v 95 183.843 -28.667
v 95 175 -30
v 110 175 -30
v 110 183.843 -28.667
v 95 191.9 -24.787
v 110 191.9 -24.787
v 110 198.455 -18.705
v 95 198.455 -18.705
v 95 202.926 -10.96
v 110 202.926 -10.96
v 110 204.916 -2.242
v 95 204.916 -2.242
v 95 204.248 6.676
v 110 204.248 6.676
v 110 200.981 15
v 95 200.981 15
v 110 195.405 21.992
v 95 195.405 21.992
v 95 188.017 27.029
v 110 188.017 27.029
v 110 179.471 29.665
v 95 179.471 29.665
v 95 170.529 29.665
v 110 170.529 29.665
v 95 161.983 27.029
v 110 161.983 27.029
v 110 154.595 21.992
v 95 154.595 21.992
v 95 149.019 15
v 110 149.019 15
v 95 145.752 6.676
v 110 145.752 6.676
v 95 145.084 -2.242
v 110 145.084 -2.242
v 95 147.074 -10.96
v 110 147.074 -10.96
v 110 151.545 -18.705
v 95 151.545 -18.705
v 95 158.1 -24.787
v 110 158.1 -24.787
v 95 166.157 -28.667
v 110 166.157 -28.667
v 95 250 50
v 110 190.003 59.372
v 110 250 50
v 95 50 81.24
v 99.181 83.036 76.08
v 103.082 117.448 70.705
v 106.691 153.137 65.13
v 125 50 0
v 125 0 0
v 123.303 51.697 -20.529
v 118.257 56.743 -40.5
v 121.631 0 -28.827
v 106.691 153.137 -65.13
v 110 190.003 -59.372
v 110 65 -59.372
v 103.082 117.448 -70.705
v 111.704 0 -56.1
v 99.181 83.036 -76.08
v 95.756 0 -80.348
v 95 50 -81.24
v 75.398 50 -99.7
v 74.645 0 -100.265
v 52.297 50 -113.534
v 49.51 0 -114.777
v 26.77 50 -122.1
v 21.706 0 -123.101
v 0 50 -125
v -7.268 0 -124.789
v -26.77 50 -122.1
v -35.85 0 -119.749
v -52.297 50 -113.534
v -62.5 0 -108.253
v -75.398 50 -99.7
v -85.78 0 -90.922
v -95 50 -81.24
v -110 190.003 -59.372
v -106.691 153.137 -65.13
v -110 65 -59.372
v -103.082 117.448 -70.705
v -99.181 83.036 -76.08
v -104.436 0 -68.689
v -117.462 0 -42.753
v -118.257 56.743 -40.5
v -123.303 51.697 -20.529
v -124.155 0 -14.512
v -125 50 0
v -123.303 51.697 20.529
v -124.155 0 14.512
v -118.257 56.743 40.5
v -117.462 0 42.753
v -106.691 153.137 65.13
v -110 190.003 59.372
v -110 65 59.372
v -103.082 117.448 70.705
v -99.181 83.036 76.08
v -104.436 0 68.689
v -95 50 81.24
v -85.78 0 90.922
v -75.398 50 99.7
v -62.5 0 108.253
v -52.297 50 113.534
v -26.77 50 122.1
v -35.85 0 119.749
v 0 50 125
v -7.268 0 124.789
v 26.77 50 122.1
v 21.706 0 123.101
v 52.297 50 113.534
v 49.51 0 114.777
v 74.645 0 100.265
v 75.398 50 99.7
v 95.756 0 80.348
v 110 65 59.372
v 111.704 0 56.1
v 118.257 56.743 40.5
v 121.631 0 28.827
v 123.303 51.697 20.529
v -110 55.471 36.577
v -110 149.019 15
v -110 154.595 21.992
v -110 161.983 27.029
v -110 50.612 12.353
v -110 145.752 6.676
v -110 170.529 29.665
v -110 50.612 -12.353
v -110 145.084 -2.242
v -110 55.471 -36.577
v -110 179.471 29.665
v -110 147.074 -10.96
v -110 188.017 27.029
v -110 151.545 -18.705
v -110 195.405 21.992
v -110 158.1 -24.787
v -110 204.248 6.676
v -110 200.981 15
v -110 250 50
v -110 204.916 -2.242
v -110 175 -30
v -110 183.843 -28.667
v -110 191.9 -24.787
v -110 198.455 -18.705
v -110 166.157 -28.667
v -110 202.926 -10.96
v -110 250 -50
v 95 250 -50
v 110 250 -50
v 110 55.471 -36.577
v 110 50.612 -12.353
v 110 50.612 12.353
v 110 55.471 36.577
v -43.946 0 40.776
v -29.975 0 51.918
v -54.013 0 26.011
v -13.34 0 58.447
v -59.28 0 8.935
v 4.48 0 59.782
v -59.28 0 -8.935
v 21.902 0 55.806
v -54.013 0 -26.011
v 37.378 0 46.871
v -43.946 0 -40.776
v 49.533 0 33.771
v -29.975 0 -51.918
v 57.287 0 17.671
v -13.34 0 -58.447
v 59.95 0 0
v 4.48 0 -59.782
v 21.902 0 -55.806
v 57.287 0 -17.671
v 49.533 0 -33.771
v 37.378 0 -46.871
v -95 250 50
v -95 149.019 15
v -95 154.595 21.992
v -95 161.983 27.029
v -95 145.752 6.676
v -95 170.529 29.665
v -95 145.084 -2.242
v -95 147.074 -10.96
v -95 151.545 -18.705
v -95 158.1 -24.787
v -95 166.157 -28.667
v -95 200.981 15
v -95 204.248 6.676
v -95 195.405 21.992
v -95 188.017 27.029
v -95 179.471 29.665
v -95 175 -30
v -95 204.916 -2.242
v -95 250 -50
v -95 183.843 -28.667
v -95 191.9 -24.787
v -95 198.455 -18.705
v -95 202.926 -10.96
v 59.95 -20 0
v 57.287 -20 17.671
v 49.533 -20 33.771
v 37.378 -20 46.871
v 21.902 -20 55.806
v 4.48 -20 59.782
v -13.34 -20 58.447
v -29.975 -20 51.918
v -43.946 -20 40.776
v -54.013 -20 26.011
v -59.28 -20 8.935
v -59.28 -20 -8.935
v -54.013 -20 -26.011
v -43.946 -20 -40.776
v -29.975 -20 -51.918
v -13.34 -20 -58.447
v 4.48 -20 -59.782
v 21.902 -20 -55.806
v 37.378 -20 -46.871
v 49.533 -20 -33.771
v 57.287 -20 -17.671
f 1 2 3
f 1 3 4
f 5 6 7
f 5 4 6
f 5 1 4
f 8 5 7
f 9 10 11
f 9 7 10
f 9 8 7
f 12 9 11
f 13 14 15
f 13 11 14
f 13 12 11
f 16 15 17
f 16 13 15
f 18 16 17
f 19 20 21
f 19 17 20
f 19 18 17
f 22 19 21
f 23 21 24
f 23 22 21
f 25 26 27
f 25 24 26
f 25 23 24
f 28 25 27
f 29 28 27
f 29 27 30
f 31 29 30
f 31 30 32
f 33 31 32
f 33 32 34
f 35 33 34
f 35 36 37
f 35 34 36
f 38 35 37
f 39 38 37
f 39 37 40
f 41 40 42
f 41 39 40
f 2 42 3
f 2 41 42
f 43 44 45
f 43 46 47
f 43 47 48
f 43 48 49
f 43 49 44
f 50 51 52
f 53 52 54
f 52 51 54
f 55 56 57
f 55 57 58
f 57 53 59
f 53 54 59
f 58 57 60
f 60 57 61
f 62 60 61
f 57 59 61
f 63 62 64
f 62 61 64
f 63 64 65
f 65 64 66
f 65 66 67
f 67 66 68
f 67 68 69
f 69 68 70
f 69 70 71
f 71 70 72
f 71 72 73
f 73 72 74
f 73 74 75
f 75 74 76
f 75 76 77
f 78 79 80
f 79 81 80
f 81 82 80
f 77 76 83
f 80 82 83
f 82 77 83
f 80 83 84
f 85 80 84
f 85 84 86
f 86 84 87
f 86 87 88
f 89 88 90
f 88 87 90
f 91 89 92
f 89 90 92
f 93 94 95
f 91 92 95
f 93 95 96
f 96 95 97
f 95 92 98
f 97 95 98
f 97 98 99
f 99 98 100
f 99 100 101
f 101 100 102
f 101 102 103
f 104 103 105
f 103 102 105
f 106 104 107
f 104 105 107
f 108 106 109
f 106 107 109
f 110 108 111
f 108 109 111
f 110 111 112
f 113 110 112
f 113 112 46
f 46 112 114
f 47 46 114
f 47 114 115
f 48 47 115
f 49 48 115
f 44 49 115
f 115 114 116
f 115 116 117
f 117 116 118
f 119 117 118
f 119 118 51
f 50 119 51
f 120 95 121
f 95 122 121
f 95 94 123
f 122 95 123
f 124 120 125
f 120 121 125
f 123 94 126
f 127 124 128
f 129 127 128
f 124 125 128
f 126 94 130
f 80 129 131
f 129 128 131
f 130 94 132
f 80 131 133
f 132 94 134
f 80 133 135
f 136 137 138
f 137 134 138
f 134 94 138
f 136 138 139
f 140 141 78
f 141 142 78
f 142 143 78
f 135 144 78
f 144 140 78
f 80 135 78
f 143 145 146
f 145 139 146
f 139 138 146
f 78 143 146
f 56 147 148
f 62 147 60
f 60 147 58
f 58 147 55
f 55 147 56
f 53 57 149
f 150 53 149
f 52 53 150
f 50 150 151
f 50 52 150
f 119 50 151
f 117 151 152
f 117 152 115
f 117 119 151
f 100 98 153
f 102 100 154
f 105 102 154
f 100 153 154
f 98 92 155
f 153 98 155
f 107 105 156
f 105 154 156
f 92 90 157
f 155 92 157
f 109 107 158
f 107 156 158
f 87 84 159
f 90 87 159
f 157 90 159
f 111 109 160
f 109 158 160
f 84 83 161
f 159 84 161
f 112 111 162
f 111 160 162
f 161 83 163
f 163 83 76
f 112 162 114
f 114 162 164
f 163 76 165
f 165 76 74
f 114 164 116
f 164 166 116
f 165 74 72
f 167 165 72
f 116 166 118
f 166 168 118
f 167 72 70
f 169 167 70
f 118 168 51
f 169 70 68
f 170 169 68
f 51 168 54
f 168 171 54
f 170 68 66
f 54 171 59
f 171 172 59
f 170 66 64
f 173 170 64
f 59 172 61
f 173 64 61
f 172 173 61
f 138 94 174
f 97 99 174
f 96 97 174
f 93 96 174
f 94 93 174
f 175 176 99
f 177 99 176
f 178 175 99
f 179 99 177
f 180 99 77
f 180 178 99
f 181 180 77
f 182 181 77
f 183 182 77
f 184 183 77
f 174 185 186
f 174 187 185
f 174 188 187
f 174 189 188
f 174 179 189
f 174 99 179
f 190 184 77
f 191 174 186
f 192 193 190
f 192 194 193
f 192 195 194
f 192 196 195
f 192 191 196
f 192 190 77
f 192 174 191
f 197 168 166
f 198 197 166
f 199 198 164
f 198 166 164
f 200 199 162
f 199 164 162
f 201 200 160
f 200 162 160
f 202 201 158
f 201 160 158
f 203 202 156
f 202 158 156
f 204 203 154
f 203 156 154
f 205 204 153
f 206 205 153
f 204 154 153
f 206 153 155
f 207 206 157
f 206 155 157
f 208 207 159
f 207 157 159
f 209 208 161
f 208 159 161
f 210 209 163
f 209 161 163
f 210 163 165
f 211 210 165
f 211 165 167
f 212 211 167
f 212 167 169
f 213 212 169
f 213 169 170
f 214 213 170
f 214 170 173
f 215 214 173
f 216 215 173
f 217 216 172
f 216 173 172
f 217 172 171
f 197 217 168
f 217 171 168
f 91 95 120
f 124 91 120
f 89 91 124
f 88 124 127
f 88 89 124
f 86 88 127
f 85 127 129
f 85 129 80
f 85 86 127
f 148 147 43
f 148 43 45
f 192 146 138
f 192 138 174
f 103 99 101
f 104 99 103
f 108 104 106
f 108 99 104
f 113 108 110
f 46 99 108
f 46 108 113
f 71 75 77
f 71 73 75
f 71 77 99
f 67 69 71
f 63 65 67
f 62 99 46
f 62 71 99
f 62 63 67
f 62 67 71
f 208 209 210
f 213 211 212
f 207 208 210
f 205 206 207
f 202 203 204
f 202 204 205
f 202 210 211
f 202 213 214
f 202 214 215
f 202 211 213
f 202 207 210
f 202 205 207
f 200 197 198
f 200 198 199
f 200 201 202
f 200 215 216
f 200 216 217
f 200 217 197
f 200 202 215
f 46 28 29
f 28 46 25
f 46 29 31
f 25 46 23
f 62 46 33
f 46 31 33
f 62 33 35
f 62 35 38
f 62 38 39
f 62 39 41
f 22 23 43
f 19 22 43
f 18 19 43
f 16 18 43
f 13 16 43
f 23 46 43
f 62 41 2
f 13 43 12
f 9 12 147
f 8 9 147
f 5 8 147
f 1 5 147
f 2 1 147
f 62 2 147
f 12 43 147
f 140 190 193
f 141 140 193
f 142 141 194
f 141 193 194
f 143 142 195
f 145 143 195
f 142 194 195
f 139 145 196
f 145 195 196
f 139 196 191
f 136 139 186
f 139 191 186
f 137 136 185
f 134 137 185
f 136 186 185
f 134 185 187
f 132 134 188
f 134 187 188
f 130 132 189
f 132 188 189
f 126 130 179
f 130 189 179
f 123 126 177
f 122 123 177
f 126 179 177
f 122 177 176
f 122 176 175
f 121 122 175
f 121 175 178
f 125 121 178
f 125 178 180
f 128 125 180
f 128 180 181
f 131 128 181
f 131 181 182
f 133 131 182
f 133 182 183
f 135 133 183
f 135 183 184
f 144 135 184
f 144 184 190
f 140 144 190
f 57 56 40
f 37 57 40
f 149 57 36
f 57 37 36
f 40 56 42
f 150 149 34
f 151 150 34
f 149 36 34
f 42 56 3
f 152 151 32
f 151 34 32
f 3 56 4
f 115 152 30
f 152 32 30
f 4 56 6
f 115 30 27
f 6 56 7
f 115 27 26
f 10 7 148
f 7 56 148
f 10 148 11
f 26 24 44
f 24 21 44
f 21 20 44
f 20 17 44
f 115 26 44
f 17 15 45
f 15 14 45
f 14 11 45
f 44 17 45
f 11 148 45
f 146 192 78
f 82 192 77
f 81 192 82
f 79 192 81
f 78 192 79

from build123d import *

# Parameters (mm, degrees)
SKETCH1_R               = 125
BOSS_EXTRUDE1_DEPTH     = 250
SKETCH3_W               = 190
SKETCH3_H               = 250
CUT_EXTRUDE1_DEPTH      = 200
CUT_EXTRUDE3_DEPTH      = 221
CUT_EXTRUDE3_DEPTH_BACK = 31
SKETCH8_R               = 30
CUT_EXTRUDE4_DEPTH      = 221
CUT_EXTRUDE4_DEPTH_BACK = 31
SKETCH6_R               = 125
CUT_EXTRUDE8_DEPTH      = 60
SKETCH7_R               = 125
CUT_EXTRUDE9_DEPTH      = 60
SKETCH9_R               = 59.95
BOSS_EXTRUDE2_DEPTH     = 20


with BuildPart() as part:
    # Sketch1 → Boss-Extrude1 (new body)
    with BuildSketch(Plane(origin=(0, 0, 0), x_dir=(1, 0, 0), z_dir=(0, 1, 0))):
        Circle(SKETCH1_R)
    extrude(amount=BOSS_EXTRUDE1_DEPTH)

    # Sketch3 → Cut-Extrude1 (cut)
    with BuildSketch(Plane(origin=(0, 250, 0), x_dir=(1, 0, 0), z_dir=(0, 1, 0))):
        Rectangle(SKETCH3_W, SKETCH3_H)
    extrude(amount=-CUT_EXTRUDE1_DEPTH, mode=Mode.SUBTRACT)

    # Sketch4 → Cut-Extrude3 (cut, two sides)
    with BuildSketch(Plane(origin=(-95, 0, 0), x_dir=(0, 0, -1), z_dir=(1, 0, 0))) as cut_extrude3_sk:
        Polygon((-81.240384046, 250), (-81.240384046, 50), (-50, 250), align=None)
        Polygon((50, 250), (81.240384046, 50), (81.240384046, 250), align=None)
    extrude(amount=CUT_EXTRUDE3_DEPTH, mode=Mode.SUBTRACT)
    extrude(cut_extrude3_sk.sketch, amount=-CUT_EXTRUDE3_DEPTH_BACK, mode=Mode.SUBTRACT)

    # Sketch8 → Cut-Extrude4 (cut, two sides)
    with BuildSketch(Plane(origin=(-95, 0, 0), x_dir=(0, 0, -1), z_dir=(1, 0, 0))) as cut_extrude4_sk:
        with Locations((0, 175)):
            Circle(SKETCH8_R)
    extrude(amount=CUT_EXTRUDE4_DEPTH, mode=Mode.SUBTRACT)
    extrude(cut_extrude4_sk.sketch, amount=-CUT_EXTRUDE4_DEPTH_BACK, mode=Mode.SUBTRACT)

    # Sketch6 → Cut-Extrude8 (cut)
    with BuildSketch(Plane(origin=(-170, 0, 0), x_dir=(0, 0, -1), z_dir=(1, 0, 0))):
        with Locations((0, 175)):
            Circle(SKETCH6_R)
    extrude(amount=CUT_EXTRUDE8_DEPTH, mode=Mode.SUBTRACT)

    # Sketch7 → Cut-Extrude9 (cut)
    with BuildSketch(Plane.ZY.offset(-170)):
        with Locations((0, 175)):
            Circle(SKETCH7_R)
    extrude(amount=CUT_EXTRUDE9_DEPTH, mode=Mode.SUBTRACT)

    # Sketch9 → Boss-Extrude2 (add)
    with BuildSketch(Plane.XZ):
        Circle(SKETCH9_R)
    extrude(amount=BOSS_EXTRUDE2_DEPTH)


solid = part.part
